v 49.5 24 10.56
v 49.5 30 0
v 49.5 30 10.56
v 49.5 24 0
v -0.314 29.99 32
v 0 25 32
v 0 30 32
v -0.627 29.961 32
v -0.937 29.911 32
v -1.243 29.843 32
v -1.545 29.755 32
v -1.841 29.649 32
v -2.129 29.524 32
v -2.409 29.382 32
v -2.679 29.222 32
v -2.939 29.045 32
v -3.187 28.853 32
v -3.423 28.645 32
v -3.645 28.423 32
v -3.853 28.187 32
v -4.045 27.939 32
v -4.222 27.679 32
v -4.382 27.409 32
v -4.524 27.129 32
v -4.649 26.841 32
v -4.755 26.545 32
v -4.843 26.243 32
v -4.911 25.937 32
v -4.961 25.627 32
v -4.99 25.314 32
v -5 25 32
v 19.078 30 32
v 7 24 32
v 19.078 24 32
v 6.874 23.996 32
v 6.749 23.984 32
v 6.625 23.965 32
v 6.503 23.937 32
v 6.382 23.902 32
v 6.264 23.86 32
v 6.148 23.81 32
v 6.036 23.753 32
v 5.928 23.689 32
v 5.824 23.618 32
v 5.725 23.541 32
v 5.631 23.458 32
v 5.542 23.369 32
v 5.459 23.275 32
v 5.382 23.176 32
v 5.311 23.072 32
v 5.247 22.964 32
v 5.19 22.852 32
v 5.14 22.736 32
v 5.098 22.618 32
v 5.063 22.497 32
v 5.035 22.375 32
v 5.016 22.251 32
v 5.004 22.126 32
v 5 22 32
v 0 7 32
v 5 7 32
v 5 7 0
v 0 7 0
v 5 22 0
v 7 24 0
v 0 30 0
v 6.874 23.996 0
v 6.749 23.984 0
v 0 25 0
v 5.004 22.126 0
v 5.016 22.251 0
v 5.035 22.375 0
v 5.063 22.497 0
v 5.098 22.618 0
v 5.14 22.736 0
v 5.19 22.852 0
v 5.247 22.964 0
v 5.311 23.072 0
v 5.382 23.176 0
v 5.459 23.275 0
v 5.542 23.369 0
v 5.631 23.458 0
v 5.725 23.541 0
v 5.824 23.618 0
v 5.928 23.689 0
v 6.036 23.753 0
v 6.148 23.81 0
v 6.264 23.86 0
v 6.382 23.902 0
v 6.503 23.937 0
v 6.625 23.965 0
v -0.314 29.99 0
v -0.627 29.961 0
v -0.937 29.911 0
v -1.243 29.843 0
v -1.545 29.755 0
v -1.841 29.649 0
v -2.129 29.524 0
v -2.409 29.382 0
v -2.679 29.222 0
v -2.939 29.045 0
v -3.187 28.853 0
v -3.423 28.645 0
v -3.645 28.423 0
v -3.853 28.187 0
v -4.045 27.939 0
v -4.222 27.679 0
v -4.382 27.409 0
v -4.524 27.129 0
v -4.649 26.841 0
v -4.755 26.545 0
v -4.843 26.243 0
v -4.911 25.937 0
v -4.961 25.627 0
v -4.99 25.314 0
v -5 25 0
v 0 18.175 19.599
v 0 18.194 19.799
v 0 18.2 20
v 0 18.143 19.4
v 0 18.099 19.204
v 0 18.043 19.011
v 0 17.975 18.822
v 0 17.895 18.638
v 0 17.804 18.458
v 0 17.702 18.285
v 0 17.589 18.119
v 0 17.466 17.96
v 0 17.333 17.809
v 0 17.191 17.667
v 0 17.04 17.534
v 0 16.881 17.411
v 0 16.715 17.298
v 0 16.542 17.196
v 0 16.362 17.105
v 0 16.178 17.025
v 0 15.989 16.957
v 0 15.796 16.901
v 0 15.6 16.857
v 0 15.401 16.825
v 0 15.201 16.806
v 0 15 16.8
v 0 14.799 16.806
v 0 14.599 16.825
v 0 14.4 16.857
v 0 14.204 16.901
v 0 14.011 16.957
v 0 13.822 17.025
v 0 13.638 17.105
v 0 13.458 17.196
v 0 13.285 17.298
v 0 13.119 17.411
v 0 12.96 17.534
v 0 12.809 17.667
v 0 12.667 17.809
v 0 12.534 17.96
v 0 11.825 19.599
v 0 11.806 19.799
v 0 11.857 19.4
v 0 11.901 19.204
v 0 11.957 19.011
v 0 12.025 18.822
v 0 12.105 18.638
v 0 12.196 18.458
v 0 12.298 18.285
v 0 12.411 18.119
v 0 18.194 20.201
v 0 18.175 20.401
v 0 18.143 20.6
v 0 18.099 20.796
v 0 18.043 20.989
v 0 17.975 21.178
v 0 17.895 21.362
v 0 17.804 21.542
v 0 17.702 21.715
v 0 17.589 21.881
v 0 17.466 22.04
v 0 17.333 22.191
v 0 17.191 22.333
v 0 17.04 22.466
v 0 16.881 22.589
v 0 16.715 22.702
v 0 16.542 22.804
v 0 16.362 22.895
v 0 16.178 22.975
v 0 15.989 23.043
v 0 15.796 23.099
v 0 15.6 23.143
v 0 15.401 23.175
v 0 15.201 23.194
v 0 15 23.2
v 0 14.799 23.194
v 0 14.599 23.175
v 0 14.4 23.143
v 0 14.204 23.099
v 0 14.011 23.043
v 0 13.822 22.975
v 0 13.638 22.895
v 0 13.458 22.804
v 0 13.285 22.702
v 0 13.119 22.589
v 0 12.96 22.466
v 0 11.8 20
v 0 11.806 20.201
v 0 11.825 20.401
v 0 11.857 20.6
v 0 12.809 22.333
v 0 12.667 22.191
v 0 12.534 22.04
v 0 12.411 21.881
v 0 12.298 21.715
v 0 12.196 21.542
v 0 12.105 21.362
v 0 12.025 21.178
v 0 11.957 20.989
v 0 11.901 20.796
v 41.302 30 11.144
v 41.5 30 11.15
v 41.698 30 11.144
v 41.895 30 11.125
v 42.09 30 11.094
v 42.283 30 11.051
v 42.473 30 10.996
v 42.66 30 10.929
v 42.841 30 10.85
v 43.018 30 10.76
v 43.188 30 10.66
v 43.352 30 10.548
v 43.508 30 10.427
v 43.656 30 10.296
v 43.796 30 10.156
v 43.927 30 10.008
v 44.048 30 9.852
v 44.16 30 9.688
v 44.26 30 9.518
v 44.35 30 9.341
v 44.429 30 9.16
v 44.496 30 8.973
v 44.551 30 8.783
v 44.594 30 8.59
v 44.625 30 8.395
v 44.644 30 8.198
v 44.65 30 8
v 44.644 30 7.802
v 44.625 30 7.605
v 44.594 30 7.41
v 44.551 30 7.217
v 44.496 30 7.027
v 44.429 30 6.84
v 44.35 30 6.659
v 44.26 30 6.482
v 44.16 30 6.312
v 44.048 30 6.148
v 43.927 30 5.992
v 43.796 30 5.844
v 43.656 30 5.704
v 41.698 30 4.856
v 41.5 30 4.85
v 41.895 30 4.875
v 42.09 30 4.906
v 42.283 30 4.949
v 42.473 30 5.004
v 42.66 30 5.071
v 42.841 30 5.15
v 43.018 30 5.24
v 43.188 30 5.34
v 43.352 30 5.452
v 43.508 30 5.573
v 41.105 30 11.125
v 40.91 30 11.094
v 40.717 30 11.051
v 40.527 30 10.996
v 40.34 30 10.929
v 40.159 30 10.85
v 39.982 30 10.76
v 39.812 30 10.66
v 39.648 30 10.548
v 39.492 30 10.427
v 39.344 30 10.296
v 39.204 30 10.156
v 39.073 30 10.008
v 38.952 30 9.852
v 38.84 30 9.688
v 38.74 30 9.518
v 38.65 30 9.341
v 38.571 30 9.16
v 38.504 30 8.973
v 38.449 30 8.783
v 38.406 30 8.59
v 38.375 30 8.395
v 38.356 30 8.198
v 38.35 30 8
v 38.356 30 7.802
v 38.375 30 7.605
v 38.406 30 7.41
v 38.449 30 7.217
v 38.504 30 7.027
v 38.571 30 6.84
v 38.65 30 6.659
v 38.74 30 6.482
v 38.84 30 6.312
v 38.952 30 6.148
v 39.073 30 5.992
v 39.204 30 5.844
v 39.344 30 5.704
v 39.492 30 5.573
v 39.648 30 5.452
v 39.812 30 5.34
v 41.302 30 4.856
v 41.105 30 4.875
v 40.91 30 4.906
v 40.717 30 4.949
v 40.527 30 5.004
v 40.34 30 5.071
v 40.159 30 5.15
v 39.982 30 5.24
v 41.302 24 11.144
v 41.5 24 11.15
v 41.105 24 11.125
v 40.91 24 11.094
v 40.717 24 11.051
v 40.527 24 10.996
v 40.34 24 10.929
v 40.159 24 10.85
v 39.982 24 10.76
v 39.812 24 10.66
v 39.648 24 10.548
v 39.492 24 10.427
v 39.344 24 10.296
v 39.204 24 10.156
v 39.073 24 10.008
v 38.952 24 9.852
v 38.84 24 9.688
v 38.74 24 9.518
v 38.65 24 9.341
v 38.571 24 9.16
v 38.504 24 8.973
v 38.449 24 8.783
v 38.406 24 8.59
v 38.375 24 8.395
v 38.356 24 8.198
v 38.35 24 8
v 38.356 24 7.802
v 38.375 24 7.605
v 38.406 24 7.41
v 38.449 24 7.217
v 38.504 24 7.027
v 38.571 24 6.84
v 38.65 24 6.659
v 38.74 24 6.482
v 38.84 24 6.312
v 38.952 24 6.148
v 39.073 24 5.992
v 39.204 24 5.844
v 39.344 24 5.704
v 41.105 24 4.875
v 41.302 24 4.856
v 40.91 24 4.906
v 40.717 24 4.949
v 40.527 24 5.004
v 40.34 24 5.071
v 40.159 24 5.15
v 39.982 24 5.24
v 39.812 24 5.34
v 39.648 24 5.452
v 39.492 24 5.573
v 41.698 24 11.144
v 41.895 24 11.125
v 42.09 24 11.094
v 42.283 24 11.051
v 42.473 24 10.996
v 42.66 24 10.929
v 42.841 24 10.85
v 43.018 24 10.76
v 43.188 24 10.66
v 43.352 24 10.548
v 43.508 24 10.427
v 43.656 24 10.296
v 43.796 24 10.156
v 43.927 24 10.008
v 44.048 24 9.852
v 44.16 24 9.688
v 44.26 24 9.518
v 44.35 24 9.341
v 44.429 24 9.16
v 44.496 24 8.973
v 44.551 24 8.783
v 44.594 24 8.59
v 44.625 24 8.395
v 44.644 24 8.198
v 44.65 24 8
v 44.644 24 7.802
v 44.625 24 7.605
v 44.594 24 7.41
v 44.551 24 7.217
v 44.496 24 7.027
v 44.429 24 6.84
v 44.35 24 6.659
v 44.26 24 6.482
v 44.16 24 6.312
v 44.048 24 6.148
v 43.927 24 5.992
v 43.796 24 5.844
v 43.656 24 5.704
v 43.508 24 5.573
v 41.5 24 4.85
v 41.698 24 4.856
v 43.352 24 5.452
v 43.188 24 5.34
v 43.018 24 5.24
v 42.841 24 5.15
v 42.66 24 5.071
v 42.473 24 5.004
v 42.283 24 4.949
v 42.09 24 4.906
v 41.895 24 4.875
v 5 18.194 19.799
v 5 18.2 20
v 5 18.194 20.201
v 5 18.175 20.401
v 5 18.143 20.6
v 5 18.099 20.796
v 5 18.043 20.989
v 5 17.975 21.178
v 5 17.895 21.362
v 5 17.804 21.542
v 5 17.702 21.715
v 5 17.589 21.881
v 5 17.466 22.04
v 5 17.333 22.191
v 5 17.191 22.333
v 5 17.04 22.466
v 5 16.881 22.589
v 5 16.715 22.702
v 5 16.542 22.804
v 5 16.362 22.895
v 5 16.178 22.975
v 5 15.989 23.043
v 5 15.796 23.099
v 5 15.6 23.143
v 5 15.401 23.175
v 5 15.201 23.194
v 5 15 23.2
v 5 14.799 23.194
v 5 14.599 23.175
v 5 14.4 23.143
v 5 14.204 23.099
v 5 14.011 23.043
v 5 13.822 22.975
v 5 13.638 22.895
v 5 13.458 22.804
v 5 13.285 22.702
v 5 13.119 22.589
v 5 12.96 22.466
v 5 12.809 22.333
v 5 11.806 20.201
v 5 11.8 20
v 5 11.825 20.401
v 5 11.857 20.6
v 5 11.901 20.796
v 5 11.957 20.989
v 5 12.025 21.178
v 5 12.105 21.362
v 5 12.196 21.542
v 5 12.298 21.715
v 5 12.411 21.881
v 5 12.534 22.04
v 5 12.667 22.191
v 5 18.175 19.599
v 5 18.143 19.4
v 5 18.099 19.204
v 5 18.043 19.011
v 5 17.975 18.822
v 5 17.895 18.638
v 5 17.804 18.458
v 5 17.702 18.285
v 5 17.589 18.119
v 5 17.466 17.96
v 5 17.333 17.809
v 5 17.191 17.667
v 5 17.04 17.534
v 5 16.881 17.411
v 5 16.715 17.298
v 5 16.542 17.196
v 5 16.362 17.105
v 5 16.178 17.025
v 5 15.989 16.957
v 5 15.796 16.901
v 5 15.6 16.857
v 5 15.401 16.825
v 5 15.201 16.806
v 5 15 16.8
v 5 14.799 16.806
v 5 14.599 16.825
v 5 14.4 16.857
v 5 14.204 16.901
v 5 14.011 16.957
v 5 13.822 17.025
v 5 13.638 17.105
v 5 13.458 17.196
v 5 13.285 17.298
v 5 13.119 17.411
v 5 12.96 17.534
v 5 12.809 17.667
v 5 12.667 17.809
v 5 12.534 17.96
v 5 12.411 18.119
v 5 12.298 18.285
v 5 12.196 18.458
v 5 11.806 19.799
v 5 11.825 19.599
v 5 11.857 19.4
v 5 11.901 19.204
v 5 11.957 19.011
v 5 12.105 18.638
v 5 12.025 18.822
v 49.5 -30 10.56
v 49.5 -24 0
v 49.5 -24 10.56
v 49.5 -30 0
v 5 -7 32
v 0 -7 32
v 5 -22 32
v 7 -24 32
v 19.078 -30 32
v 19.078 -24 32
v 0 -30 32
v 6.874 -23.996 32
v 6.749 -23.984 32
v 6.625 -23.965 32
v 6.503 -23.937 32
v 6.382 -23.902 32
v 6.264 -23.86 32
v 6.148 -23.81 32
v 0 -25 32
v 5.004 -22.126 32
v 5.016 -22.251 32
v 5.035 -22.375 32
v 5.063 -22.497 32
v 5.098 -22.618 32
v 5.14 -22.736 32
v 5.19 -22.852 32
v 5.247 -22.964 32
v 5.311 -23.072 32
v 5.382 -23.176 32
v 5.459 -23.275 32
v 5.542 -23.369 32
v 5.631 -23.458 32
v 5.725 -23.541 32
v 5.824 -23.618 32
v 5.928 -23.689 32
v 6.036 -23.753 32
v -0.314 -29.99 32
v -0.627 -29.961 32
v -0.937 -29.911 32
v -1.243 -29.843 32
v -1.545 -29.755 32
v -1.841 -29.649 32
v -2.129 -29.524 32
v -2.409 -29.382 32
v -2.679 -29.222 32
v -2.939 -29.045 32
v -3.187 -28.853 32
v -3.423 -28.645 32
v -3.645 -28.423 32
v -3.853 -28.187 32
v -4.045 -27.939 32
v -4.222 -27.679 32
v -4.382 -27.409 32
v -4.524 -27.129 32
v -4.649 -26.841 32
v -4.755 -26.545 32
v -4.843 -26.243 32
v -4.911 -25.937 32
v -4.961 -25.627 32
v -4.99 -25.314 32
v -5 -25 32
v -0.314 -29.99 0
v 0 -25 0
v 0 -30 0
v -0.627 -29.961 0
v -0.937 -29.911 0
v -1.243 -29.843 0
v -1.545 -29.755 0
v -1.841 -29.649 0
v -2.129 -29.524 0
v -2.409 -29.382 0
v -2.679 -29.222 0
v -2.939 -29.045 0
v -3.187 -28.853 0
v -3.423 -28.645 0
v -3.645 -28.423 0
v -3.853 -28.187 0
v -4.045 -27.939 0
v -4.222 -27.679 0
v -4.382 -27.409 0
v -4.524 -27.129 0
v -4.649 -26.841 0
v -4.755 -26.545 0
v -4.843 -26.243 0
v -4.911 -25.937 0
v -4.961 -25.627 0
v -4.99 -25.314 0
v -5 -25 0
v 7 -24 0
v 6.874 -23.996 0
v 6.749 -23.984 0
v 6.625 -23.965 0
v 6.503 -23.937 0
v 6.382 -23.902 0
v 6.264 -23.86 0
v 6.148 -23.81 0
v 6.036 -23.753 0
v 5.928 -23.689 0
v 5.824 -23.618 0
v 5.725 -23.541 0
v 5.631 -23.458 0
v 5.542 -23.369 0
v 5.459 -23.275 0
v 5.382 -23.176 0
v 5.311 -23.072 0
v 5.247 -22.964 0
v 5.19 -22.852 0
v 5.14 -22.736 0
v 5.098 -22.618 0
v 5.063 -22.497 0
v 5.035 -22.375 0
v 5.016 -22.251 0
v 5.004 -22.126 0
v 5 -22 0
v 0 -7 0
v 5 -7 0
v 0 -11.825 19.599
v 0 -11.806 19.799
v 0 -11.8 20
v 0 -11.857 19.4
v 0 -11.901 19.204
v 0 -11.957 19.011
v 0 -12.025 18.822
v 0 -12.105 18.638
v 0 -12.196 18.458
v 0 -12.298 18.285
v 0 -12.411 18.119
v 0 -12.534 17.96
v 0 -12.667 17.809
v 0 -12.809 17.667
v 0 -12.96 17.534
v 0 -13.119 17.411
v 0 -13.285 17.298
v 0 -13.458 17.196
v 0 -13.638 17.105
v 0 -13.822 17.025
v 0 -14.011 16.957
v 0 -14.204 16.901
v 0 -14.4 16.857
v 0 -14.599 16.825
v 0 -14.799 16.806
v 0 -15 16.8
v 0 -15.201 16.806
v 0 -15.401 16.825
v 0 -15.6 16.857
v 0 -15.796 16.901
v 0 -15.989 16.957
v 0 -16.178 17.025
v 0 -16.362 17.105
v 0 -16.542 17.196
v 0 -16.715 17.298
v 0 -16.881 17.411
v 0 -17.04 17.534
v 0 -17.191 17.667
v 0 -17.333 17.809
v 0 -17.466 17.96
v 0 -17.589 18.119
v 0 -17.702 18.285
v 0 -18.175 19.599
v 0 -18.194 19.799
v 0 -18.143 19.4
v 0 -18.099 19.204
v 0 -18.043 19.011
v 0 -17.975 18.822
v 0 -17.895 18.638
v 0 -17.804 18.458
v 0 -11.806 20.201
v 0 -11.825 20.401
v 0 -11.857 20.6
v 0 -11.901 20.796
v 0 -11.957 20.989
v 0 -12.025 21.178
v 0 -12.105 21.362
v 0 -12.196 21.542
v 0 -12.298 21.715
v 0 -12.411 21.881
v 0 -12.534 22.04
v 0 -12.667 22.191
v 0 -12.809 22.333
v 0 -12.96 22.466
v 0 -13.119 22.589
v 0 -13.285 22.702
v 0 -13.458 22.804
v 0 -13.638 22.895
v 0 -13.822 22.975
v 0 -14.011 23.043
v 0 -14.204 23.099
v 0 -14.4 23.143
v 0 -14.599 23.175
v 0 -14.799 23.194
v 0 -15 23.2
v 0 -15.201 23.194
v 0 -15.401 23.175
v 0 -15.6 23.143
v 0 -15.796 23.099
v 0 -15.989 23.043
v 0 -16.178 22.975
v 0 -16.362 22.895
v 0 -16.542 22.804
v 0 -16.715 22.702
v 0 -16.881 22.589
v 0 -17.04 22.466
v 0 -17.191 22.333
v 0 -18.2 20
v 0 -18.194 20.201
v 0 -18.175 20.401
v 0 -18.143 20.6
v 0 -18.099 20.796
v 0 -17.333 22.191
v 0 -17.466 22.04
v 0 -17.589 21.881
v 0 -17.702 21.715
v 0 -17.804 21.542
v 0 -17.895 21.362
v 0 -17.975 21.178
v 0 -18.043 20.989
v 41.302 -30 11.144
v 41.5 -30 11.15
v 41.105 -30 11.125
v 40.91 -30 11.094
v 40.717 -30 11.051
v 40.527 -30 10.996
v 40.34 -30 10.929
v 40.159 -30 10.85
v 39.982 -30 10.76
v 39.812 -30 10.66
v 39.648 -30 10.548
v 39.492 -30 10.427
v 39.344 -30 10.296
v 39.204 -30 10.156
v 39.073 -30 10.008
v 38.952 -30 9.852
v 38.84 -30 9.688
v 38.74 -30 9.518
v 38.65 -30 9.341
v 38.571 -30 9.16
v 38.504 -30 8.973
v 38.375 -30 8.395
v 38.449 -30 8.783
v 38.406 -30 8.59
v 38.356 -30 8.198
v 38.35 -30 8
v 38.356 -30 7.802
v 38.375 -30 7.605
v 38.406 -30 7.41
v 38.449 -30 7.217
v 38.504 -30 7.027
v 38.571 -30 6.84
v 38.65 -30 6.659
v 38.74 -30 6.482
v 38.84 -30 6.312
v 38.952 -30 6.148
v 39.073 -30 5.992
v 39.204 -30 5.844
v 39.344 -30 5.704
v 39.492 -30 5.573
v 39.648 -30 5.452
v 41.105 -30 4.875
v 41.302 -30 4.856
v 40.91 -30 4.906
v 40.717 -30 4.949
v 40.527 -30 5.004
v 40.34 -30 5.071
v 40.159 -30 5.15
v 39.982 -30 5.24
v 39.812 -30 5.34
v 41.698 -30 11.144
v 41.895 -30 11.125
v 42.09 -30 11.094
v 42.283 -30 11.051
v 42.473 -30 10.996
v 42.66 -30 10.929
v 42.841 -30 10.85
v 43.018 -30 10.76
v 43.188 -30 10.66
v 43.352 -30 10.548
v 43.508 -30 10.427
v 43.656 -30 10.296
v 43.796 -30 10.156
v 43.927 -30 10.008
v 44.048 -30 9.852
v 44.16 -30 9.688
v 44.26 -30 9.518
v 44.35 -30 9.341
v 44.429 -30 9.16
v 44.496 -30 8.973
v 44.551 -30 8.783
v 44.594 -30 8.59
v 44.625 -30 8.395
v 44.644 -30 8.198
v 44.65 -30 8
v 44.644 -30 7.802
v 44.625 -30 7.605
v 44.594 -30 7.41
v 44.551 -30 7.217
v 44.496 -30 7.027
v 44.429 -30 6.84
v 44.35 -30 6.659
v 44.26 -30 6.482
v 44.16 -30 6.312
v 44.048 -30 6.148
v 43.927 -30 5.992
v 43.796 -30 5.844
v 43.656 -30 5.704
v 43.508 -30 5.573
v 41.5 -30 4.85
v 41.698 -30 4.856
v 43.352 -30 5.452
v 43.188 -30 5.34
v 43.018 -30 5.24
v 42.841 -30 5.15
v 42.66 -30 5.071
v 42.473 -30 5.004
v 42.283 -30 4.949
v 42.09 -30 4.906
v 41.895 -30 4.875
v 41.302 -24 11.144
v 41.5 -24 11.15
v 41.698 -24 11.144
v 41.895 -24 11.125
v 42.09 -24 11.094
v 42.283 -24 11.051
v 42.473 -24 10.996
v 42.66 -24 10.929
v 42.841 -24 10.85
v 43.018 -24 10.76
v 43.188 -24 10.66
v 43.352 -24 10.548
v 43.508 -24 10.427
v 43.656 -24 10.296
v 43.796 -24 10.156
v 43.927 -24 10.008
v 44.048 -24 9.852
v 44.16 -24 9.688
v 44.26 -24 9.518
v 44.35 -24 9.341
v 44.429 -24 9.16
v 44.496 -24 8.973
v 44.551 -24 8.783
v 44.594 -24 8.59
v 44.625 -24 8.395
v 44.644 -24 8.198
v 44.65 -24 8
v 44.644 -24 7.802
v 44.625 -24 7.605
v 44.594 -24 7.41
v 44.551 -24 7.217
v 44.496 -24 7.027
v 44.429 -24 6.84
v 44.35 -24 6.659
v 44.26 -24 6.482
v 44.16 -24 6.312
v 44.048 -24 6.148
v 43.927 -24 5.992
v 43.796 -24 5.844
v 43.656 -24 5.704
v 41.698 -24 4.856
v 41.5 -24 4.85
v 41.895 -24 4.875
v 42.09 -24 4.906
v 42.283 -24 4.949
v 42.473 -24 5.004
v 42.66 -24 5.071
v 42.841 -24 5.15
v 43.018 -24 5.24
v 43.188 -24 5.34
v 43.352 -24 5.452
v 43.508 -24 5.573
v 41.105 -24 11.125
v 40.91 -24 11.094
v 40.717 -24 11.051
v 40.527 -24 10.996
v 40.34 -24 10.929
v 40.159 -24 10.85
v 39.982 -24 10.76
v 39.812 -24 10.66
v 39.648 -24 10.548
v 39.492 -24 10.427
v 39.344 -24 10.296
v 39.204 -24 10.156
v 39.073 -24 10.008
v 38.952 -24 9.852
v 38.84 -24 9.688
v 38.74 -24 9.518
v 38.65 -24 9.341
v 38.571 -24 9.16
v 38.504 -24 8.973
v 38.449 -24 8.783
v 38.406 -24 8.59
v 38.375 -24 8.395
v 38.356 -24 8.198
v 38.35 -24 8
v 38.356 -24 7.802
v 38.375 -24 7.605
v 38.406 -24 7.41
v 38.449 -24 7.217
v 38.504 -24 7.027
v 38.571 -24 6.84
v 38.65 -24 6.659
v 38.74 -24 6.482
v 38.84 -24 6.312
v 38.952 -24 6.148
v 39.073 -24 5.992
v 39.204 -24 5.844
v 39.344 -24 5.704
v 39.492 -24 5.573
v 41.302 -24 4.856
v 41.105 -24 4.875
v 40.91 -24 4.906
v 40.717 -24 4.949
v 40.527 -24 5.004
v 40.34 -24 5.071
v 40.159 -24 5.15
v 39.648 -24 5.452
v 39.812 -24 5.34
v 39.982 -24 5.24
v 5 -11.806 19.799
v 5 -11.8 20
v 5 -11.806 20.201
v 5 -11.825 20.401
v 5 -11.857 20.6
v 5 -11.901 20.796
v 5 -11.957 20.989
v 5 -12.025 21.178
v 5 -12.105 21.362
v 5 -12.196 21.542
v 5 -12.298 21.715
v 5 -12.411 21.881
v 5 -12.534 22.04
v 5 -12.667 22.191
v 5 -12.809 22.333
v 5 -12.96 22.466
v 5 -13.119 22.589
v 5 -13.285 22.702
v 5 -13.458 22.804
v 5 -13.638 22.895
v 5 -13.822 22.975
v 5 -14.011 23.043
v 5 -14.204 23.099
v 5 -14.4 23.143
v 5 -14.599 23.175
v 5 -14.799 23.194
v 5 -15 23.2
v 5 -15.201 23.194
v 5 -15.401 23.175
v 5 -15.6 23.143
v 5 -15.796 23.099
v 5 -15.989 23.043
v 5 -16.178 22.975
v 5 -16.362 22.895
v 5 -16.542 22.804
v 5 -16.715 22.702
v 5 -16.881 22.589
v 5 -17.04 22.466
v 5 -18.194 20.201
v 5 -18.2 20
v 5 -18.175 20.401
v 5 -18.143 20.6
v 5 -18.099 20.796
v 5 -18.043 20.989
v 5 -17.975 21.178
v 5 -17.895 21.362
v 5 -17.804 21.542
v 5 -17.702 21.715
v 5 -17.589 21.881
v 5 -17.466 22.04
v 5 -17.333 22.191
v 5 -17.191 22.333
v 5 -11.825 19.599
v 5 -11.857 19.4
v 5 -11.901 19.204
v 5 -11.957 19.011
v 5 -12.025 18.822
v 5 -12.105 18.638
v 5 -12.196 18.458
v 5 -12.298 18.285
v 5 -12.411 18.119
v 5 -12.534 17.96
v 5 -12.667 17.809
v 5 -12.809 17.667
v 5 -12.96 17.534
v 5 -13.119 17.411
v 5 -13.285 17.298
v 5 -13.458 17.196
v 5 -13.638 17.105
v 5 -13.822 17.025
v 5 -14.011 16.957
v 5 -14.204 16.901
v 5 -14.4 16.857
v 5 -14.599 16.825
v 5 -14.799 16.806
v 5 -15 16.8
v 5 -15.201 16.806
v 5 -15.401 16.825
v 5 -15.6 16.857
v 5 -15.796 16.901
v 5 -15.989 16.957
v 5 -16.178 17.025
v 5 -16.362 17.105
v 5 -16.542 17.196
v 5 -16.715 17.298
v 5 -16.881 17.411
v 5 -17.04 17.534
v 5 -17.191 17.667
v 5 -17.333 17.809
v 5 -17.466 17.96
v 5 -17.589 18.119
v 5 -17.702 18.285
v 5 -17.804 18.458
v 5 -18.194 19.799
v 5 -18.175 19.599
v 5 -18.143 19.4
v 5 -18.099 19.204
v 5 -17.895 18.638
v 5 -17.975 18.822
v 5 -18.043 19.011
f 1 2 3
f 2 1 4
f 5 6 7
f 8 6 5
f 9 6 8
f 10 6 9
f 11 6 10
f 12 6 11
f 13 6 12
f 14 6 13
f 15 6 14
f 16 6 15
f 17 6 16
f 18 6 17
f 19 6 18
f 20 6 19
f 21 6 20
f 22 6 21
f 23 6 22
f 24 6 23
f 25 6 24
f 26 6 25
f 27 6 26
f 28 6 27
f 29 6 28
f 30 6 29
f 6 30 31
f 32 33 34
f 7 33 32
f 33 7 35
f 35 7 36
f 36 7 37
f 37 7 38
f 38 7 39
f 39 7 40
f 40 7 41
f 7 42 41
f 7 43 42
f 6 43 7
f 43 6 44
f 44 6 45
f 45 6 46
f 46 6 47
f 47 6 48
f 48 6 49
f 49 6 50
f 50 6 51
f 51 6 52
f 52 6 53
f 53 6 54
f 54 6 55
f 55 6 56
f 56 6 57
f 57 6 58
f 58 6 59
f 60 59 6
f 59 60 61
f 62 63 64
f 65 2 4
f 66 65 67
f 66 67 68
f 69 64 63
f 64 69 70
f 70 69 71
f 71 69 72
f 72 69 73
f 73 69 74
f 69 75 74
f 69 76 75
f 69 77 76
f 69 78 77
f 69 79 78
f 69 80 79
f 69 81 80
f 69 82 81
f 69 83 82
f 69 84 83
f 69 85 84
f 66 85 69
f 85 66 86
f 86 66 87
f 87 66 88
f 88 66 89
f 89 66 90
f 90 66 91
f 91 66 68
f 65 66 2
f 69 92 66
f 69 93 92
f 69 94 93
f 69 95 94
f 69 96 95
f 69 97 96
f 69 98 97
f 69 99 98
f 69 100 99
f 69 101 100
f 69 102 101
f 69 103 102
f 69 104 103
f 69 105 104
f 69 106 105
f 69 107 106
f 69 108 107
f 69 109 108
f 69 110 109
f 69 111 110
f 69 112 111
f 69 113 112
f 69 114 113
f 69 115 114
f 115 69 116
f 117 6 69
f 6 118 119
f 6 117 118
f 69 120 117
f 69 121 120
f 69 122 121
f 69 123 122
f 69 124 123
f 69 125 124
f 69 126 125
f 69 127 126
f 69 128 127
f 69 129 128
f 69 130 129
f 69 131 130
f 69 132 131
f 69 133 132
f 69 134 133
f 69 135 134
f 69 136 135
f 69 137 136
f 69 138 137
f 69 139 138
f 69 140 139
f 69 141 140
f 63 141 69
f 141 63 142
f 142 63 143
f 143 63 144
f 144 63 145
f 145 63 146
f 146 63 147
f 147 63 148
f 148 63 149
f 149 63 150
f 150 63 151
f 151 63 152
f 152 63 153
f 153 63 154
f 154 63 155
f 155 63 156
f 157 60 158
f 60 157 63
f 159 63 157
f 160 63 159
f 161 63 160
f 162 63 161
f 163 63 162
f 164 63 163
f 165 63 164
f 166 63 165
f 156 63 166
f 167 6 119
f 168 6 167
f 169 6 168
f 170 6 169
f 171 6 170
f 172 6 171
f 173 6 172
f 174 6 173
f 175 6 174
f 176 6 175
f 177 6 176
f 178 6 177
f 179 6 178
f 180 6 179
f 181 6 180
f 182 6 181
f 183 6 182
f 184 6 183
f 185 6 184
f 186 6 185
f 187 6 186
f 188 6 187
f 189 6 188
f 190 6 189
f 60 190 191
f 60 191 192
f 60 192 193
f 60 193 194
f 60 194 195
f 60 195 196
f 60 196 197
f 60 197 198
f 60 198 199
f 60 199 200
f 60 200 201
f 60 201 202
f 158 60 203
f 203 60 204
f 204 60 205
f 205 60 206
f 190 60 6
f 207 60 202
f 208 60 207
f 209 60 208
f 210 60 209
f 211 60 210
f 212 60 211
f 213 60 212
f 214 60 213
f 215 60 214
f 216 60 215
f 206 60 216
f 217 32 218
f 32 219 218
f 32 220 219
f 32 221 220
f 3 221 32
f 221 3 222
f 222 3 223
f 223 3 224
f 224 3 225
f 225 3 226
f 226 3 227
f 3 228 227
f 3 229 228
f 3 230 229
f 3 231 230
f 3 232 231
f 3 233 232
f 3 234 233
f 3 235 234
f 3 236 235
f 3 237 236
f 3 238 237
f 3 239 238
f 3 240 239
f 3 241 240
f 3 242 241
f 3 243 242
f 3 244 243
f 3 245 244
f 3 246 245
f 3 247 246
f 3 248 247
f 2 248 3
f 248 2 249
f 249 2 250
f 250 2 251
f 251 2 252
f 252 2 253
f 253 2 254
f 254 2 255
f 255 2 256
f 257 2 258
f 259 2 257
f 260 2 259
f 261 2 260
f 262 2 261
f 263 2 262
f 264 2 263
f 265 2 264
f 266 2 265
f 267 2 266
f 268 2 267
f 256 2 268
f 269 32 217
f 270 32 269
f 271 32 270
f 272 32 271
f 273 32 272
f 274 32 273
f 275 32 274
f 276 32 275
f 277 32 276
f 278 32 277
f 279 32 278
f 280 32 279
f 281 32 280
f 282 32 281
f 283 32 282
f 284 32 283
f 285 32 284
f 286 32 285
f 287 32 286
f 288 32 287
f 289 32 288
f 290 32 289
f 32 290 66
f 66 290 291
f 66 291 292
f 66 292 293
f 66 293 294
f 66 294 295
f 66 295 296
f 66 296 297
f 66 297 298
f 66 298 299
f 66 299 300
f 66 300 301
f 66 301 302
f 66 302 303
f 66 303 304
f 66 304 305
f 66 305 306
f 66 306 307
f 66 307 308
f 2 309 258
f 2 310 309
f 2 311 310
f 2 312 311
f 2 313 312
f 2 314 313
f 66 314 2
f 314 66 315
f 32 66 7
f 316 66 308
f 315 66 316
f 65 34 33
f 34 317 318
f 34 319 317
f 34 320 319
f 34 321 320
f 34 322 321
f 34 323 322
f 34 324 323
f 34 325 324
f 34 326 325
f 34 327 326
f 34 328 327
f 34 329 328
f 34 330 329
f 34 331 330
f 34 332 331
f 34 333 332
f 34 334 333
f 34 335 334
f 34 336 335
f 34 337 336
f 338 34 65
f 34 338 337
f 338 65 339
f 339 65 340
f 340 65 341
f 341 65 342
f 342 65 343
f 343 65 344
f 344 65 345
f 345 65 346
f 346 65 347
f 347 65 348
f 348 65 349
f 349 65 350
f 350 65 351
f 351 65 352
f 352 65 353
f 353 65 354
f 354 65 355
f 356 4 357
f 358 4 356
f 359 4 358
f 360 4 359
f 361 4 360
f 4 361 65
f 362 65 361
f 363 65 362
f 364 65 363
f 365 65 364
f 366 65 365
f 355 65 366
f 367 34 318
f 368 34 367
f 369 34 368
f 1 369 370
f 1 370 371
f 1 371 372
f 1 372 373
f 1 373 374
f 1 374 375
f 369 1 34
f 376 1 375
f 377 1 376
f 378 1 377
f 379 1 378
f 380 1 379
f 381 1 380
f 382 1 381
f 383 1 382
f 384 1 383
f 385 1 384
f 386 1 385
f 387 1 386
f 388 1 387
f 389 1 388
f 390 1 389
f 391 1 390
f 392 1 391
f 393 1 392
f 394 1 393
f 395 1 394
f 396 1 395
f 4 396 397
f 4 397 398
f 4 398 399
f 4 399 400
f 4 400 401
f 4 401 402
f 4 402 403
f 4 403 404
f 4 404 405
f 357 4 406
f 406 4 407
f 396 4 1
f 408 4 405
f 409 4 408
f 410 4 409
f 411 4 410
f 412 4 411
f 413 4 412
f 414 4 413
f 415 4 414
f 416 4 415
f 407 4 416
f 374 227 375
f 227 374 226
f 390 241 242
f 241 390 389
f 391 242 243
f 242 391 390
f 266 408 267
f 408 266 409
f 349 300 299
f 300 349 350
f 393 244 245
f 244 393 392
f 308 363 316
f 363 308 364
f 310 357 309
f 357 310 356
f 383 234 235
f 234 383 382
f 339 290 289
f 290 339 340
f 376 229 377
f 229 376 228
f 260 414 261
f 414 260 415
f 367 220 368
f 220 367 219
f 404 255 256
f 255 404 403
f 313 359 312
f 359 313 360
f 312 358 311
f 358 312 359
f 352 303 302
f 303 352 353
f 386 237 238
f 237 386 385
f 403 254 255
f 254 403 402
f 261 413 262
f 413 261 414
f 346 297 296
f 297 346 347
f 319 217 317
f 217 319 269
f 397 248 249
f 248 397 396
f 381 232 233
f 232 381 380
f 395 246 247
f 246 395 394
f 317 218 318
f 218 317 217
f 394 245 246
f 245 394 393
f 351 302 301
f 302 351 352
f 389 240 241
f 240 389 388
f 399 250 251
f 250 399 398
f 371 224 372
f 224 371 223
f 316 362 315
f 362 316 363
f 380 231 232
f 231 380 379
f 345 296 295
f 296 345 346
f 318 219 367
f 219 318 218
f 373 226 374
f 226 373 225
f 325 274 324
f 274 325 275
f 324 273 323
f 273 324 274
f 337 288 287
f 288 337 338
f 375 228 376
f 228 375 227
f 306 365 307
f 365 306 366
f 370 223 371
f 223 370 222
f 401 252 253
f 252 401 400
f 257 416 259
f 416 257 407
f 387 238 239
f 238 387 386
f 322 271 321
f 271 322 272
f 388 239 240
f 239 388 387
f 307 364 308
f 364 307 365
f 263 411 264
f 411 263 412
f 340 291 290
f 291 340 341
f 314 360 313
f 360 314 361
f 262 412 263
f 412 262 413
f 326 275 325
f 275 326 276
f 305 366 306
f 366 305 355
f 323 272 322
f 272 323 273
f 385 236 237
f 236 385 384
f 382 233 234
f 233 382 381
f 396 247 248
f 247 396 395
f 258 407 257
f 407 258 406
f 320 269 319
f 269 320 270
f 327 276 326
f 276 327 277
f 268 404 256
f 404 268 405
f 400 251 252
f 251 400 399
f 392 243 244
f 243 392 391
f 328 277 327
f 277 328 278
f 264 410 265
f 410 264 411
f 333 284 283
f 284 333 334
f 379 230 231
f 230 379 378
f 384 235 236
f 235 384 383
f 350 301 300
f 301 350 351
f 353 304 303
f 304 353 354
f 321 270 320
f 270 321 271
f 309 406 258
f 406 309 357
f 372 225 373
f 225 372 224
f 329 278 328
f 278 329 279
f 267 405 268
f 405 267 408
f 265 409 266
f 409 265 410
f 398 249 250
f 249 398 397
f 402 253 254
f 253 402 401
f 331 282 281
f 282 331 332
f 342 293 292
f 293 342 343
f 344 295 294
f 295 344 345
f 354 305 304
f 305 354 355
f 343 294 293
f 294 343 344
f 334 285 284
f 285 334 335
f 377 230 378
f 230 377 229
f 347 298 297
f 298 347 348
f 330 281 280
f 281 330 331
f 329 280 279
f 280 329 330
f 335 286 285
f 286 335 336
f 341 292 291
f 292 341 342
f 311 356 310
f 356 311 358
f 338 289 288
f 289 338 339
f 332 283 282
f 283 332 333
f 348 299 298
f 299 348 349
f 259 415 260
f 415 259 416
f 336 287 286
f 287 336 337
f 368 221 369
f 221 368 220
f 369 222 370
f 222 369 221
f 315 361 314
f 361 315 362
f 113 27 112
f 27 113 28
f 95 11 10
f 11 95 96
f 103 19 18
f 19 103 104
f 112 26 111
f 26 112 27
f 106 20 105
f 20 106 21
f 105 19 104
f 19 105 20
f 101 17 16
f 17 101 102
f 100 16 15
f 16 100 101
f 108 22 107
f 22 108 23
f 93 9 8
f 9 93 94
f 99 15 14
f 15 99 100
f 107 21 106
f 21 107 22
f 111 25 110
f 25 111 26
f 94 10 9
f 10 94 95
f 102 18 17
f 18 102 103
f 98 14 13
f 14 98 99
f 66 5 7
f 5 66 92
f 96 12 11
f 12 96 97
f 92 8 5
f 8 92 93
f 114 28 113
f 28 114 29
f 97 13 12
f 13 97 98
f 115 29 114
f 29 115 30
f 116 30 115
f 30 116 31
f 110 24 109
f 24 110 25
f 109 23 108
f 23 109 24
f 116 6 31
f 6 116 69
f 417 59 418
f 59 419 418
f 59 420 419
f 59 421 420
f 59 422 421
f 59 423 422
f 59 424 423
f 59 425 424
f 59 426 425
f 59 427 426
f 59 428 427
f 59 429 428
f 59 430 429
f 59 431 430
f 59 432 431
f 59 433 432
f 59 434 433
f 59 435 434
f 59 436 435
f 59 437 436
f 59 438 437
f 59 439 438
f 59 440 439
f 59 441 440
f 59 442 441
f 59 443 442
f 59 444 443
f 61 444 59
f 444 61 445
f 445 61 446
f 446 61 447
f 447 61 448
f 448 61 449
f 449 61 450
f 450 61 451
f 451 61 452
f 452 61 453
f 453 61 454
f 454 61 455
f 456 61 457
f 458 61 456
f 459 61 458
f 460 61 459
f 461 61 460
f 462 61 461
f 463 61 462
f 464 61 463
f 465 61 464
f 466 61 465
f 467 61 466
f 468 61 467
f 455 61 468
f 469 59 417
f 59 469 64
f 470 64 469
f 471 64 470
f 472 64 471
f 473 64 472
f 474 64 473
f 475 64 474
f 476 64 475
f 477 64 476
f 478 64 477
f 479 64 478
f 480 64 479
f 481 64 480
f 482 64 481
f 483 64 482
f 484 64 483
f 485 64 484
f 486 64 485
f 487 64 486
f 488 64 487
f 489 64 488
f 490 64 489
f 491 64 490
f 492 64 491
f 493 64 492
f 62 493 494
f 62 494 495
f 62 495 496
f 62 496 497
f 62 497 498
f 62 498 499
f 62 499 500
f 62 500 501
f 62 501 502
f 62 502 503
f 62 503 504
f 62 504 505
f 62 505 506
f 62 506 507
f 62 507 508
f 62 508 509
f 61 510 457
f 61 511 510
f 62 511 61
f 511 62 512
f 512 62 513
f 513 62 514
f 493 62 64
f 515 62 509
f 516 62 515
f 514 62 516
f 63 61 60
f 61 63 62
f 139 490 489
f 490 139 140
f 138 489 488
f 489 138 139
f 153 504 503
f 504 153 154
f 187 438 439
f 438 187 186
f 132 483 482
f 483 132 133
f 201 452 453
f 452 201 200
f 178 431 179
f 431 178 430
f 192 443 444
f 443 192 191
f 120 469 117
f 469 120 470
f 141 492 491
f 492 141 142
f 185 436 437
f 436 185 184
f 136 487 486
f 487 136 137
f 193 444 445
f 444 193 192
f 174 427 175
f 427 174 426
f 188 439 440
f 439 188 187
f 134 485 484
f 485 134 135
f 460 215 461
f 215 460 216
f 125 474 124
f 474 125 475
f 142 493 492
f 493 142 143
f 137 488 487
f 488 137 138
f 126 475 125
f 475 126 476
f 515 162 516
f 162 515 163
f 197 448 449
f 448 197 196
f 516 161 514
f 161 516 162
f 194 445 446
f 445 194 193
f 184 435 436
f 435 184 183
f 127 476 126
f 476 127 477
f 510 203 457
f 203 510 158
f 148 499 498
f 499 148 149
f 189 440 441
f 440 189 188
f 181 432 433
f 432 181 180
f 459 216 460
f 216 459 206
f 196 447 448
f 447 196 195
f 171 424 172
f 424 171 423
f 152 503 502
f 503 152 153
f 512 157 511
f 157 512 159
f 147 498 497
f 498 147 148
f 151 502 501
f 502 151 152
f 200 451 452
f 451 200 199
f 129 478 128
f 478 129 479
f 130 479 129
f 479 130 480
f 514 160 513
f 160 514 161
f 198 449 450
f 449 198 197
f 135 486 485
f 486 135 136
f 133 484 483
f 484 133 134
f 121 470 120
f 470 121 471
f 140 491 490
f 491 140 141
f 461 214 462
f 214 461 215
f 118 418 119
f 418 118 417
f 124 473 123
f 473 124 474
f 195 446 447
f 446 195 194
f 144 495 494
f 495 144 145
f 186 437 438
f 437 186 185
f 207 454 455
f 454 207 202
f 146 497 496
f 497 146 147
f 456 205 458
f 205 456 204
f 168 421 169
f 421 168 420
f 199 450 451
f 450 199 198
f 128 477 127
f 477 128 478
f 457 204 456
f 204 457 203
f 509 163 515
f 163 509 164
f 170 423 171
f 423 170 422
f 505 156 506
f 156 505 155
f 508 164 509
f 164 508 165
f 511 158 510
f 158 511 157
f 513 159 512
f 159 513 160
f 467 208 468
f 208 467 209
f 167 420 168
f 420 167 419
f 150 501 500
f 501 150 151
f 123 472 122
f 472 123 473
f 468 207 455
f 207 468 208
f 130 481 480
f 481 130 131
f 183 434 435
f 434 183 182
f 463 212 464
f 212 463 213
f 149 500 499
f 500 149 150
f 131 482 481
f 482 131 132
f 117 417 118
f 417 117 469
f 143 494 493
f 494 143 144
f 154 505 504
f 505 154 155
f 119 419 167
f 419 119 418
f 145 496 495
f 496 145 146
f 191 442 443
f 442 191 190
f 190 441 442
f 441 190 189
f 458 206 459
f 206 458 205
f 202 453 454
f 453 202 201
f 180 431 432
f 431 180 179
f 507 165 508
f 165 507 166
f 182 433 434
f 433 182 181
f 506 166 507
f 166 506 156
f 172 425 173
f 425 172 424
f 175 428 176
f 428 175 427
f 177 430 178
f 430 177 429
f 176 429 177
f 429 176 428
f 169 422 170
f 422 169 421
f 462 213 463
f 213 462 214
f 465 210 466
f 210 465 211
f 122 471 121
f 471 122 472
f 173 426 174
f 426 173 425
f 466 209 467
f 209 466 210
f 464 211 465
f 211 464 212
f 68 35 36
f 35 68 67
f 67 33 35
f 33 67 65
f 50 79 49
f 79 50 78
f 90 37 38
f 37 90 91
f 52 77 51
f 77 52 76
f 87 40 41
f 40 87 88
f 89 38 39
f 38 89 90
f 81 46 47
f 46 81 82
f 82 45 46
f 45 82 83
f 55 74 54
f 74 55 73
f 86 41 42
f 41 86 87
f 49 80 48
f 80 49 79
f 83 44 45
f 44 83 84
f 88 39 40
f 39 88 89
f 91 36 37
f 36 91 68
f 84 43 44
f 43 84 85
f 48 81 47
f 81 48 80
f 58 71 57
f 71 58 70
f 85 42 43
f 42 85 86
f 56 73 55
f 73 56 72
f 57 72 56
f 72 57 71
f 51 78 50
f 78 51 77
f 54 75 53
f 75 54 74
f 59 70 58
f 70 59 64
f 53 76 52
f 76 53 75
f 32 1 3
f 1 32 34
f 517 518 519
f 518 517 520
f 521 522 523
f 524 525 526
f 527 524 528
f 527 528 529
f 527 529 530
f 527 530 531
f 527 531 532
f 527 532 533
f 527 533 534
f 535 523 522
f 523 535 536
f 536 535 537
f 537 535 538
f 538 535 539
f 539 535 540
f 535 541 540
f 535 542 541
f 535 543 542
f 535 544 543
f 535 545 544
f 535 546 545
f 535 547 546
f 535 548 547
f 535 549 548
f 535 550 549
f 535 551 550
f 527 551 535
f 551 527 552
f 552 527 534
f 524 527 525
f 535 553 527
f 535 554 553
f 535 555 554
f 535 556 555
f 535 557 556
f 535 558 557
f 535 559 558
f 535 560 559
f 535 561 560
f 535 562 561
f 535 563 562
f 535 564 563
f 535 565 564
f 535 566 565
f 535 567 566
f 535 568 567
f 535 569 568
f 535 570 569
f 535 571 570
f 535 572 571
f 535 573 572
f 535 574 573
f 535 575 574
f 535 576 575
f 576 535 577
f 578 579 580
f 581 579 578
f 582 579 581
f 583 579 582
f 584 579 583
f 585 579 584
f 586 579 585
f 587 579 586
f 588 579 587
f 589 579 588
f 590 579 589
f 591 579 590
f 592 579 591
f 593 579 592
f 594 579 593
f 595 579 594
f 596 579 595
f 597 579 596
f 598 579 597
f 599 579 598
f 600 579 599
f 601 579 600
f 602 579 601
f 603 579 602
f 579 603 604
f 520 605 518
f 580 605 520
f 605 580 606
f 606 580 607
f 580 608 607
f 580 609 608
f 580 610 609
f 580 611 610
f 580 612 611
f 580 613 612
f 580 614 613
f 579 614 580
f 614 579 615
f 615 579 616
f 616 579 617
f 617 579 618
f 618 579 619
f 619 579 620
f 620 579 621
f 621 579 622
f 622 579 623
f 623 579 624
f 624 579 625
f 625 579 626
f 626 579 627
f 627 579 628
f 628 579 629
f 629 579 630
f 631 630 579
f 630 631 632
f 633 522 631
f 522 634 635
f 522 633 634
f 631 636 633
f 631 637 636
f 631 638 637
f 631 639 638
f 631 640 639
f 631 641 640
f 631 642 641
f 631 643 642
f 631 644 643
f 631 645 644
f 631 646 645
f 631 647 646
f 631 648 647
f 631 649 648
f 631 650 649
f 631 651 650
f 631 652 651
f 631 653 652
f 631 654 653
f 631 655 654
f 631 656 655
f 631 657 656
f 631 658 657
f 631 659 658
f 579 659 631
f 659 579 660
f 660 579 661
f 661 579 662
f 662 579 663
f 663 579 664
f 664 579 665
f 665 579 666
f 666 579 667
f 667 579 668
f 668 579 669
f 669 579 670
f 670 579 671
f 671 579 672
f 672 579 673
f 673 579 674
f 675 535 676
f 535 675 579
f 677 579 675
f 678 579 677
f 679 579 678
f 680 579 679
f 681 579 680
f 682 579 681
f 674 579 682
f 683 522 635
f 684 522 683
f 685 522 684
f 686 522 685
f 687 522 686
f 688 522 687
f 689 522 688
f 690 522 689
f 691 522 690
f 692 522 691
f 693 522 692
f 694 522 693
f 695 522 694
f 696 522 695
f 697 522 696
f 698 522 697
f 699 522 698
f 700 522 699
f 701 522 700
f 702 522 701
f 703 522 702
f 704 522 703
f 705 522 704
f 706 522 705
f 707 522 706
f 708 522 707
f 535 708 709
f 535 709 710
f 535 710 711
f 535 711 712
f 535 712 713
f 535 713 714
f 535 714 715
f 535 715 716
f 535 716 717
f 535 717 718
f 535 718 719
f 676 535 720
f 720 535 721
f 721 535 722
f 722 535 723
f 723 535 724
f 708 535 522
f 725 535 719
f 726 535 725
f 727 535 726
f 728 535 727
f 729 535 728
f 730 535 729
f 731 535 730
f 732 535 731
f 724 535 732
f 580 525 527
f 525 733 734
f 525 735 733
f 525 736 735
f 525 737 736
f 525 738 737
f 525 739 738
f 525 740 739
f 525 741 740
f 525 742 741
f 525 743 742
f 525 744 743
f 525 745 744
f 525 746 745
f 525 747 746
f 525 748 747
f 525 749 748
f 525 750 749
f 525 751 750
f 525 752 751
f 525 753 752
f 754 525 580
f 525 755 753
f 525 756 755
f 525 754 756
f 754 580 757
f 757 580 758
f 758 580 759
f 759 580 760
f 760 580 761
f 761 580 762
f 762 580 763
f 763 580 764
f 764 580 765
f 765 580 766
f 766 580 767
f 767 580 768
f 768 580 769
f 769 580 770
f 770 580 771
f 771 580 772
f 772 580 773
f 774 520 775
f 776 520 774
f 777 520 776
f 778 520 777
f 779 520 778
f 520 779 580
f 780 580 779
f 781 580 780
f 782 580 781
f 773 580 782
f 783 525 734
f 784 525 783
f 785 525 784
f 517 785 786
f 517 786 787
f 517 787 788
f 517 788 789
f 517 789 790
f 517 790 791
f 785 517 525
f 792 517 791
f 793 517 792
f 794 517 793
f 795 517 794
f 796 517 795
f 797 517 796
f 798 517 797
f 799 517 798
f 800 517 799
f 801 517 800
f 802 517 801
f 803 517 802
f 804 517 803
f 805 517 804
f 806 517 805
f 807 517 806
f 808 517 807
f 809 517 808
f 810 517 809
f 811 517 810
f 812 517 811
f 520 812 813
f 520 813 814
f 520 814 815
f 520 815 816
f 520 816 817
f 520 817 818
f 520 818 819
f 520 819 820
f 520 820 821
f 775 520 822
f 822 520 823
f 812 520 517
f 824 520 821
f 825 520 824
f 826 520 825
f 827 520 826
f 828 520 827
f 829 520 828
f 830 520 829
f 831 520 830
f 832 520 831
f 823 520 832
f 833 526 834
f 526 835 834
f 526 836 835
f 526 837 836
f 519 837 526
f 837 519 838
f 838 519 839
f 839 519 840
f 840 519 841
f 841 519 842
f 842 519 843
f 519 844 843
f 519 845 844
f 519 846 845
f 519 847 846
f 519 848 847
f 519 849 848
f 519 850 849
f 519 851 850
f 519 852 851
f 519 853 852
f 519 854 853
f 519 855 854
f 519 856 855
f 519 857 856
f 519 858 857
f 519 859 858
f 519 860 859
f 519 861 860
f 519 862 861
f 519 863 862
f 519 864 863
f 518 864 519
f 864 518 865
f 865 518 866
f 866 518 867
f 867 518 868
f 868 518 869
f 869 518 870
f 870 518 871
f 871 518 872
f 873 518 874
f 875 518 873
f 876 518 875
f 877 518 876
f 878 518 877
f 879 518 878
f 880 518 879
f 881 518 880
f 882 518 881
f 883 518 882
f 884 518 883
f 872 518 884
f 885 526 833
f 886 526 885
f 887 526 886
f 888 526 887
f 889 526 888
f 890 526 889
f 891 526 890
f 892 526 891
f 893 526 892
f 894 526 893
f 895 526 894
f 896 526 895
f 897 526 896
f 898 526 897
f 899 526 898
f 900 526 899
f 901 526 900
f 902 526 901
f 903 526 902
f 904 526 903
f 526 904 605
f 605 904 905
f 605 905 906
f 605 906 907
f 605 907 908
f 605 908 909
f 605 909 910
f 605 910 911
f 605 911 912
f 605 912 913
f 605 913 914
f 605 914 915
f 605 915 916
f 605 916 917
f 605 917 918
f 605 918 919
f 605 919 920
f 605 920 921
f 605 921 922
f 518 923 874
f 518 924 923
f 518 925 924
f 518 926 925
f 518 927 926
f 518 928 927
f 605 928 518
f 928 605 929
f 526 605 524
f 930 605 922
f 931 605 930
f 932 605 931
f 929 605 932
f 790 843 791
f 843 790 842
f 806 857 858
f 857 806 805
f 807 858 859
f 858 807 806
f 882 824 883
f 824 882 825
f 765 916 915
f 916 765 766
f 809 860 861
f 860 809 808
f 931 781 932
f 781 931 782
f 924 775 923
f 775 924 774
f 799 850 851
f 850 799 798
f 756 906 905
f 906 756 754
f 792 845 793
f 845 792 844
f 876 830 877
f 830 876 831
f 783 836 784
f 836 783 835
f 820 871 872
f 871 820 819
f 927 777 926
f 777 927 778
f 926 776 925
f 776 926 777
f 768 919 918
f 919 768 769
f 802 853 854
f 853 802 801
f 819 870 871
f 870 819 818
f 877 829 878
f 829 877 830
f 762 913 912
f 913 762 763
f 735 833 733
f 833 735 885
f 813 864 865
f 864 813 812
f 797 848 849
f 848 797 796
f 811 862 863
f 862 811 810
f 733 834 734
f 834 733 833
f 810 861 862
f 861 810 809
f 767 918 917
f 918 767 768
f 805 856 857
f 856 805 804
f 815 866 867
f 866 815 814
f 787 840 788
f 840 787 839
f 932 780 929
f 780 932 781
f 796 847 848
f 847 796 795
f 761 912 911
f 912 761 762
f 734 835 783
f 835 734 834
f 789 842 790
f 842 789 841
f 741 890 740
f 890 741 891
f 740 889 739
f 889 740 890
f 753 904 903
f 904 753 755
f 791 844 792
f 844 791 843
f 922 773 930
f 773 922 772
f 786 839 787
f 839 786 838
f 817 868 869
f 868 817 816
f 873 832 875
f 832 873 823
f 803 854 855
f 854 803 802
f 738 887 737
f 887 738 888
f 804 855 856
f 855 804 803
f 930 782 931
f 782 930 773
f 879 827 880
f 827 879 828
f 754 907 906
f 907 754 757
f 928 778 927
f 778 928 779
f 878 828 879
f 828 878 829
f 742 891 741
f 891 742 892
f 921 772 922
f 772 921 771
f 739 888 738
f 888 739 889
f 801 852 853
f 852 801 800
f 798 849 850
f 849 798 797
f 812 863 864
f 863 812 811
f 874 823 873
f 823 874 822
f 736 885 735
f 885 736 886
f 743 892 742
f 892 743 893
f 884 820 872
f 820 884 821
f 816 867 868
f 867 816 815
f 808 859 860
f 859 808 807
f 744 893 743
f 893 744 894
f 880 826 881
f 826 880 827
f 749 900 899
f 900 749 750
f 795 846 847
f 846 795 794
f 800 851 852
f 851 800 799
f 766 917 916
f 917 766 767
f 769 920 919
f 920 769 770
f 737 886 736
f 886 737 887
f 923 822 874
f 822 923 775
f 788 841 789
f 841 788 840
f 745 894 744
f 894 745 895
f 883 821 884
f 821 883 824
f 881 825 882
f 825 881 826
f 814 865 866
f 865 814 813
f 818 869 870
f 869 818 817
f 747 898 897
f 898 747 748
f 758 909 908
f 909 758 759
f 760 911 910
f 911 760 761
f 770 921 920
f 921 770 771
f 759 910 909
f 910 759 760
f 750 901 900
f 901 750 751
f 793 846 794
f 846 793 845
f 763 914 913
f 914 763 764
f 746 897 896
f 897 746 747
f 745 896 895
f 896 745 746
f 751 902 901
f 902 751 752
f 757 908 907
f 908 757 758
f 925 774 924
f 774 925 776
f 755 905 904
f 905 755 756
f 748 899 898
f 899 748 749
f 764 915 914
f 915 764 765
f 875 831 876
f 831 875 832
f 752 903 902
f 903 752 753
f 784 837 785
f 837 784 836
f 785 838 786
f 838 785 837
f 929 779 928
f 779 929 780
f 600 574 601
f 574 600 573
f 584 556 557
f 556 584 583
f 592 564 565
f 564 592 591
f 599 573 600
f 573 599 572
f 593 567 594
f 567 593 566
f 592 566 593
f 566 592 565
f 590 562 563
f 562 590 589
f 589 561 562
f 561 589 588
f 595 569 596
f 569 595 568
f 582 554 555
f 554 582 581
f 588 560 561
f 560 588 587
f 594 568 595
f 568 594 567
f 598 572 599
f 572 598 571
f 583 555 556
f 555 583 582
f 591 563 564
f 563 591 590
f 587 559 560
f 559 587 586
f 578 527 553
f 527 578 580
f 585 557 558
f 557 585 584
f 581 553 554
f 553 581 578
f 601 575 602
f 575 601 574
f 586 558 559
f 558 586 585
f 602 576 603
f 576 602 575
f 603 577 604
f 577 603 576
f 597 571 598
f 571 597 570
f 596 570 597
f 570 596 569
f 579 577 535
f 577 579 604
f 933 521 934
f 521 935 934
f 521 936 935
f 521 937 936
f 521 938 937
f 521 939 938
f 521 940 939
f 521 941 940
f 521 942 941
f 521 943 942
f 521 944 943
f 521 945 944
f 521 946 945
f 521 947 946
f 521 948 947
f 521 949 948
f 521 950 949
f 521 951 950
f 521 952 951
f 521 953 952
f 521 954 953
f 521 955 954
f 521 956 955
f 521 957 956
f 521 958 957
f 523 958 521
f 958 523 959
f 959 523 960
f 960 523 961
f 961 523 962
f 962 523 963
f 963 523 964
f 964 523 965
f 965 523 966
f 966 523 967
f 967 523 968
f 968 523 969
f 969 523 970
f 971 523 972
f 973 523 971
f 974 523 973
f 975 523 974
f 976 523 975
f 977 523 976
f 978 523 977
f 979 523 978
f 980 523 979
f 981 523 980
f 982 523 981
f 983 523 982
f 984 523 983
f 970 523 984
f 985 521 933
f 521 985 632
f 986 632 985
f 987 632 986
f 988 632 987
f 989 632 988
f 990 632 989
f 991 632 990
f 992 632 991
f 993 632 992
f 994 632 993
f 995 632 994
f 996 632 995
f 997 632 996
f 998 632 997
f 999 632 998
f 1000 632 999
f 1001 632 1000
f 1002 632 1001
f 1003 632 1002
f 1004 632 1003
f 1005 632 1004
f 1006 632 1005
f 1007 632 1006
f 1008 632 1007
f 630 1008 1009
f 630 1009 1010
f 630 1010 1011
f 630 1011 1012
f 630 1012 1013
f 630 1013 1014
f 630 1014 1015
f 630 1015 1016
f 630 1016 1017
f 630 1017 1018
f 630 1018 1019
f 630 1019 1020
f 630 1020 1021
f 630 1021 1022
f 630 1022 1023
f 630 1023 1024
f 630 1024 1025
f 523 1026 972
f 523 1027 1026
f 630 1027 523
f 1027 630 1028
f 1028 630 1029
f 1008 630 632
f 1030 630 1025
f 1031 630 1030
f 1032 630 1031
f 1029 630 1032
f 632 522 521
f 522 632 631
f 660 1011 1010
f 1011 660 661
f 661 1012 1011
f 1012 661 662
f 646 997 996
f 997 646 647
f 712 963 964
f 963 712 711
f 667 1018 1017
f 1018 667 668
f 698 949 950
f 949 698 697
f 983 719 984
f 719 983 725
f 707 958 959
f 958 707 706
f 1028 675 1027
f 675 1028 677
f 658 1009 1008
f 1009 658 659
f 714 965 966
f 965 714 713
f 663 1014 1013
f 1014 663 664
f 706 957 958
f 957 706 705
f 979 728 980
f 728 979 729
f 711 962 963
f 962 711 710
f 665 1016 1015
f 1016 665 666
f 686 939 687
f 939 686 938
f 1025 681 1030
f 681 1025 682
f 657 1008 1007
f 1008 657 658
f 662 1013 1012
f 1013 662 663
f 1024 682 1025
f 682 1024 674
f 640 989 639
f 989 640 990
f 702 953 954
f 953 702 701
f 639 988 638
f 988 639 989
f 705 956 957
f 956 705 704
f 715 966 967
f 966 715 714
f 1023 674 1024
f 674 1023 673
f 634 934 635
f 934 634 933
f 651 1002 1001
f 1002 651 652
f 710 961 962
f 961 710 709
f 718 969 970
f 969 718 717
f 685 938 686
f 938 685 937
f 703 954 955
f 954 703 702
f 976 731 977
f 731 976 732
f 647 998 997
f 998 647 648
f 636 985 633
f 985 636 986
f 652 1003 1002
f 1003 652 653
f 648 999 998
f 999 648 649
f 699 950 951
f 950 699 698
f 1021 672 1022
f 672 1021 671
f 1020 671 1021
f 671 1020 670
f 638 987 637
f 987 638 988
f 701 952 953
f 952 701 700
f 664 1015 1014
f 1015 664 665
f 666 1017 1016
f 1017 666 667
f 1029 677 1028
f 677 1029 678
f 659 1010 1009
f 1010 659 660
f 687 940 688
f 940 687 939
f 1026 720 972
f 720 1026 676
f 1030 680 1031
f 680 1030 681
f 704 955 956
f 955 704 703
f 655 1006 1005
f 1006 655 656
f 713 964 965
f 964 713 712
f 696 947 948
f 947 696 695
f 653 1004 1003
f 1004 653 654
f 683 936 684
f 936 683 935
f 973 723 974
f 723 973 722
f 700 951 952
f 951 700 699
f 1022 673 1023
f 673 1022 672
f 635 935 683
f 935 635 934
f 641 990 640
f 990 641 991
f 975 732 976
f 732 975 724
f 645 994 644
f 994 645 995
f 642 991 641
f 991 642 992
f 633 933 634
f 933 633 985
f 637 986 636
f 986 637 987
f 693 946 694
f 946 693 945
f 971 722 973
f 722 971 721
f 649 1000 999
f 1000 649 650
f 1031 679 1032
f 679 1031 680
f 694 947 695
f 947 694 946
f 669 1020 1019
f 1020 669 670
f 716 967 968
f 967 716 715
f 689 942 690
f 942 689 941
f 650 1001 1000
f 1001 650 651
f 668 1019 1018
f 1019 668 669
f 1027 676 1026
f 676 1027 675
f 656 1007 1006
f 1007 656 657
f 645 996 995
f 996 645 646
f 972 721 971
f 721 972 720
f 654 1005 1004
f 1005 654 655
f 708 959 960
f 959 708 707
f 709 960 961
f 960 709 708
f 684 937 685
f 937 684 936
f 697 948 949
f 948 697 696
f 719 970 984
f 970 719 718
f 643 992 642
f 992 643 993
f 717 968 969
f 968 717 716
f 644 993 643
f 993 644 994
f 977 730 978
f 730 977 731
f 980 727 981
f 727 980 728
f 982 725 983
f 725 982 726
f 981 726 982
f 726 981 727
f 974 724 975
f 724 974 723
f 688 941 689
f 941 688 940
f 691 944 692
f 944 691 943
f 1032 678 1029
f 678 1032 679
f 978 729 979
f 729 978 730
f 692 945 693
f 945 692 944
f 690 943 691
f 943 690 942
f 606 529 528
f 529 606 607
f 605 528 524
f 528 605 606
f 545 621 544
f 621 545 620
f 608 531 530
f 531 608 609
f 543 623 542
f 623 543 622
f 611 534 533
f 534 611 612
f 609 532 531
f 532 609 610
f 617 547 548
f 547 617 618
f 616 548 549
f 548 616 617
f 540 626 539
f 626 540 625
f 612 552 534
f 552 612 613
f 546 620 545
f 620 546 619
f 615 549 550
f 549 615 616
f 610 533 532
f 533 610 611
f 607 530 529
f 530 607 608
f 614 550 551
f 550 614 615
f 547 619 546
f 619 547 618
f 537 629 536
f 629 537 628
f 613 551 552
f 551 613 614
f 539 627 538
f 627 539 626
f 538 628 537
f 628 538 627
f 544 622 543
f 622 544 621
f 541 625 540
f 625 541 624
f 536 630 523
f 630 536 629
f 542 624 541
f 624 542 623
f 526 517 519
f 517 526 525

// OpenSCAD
// Created from Code_Diagonal (x2).stl
// https://github.com/Mecan0/Code
// By J.Rodigo (www.jra.so)
// Licence Creative commons atribution & share alike.

/**************************/
// Parámetros de la pieza  /
/**************************/

dTalaX = 6.3;	//Diámetro del taladro del bloque X 

dTalaY = 6.4;	//Diámetro del taladro del bloque Y 



y = 148;        //Aproximado, un poco a ojo
x = 210;//round(155*cos(38)+2*15);   //Distancia en X del marco al fondo de la base de la impresora. En modelo inicial, 152

alfa = atan(y/x);

xTalaX = round(x-155*cos(alfa))/2;      //Posición en X del taladro del bloque X
echo (xTalaX);
echo (alfa);


// Bloque a lo largo del eje X
module bloqueX(){
	// Bloque y taladro
	difference () {
		translate([0, -6, 0])
		cube([xTalaX+8, 6, 32]);
	
		translate([xTalaX, 1, 8])
		rotate( 90, [1, 0, 0])
		cylinder(h = 8, r = dTalaX/2, $fn=100);
	}

	// Esquina redondeada
	difference () {
		translate([0, -5, 0])
		cylinder(h = 32, r = 5, $fn=100);

		translate([-5, -10, -1])
		cube([10, 5, 34]);
	}	
}

// Bloque a lo largo del eje Y
module bloqueY(){
	// Bloque y taladro
	difference () {
		translate([0, -23, 0])
		cube([5, 23, 32]);

		translate([-1, -15, 20])
		rotate( 90, [0, 1, 0])
		cylinder(h = 7, r = dTalaY/2, $fn=100);
	}
}

// Redondeo entre los bloques X y Y
module redondeoXY(){
	difference () {
		cube([2, 2, 32]);
		
		translate([2, 0, -1])
		cylinder(h = 34, r = 2, $fn=100);
	}
}

// Unión de todos los bloques
module pieza(){
	difference () {
		union() {
			bloqueX();

			bloqueY();

			translate([5, -8, 0])
			redondeoXY();
		}	

		//Chaflan que afecta al bloqueX() y al redondeoXY()
		translate([xTalaX+8, -7, 10.56])
		rotate( 90-alfa, [0, -1, 0])
		cube([18, 8, sqrt(23*23+xTalaX*xTalaX)]);	
	}
}

/**************************/
//  Generamos las piezas   /
/**************************/

// Pieza normal

	translate([0, 30, 0])
	pieza();

// Pieza simetrica

	translate([0, -30, 0])
	mirror([ 0, 1, 0 ]) 
	pieza();
